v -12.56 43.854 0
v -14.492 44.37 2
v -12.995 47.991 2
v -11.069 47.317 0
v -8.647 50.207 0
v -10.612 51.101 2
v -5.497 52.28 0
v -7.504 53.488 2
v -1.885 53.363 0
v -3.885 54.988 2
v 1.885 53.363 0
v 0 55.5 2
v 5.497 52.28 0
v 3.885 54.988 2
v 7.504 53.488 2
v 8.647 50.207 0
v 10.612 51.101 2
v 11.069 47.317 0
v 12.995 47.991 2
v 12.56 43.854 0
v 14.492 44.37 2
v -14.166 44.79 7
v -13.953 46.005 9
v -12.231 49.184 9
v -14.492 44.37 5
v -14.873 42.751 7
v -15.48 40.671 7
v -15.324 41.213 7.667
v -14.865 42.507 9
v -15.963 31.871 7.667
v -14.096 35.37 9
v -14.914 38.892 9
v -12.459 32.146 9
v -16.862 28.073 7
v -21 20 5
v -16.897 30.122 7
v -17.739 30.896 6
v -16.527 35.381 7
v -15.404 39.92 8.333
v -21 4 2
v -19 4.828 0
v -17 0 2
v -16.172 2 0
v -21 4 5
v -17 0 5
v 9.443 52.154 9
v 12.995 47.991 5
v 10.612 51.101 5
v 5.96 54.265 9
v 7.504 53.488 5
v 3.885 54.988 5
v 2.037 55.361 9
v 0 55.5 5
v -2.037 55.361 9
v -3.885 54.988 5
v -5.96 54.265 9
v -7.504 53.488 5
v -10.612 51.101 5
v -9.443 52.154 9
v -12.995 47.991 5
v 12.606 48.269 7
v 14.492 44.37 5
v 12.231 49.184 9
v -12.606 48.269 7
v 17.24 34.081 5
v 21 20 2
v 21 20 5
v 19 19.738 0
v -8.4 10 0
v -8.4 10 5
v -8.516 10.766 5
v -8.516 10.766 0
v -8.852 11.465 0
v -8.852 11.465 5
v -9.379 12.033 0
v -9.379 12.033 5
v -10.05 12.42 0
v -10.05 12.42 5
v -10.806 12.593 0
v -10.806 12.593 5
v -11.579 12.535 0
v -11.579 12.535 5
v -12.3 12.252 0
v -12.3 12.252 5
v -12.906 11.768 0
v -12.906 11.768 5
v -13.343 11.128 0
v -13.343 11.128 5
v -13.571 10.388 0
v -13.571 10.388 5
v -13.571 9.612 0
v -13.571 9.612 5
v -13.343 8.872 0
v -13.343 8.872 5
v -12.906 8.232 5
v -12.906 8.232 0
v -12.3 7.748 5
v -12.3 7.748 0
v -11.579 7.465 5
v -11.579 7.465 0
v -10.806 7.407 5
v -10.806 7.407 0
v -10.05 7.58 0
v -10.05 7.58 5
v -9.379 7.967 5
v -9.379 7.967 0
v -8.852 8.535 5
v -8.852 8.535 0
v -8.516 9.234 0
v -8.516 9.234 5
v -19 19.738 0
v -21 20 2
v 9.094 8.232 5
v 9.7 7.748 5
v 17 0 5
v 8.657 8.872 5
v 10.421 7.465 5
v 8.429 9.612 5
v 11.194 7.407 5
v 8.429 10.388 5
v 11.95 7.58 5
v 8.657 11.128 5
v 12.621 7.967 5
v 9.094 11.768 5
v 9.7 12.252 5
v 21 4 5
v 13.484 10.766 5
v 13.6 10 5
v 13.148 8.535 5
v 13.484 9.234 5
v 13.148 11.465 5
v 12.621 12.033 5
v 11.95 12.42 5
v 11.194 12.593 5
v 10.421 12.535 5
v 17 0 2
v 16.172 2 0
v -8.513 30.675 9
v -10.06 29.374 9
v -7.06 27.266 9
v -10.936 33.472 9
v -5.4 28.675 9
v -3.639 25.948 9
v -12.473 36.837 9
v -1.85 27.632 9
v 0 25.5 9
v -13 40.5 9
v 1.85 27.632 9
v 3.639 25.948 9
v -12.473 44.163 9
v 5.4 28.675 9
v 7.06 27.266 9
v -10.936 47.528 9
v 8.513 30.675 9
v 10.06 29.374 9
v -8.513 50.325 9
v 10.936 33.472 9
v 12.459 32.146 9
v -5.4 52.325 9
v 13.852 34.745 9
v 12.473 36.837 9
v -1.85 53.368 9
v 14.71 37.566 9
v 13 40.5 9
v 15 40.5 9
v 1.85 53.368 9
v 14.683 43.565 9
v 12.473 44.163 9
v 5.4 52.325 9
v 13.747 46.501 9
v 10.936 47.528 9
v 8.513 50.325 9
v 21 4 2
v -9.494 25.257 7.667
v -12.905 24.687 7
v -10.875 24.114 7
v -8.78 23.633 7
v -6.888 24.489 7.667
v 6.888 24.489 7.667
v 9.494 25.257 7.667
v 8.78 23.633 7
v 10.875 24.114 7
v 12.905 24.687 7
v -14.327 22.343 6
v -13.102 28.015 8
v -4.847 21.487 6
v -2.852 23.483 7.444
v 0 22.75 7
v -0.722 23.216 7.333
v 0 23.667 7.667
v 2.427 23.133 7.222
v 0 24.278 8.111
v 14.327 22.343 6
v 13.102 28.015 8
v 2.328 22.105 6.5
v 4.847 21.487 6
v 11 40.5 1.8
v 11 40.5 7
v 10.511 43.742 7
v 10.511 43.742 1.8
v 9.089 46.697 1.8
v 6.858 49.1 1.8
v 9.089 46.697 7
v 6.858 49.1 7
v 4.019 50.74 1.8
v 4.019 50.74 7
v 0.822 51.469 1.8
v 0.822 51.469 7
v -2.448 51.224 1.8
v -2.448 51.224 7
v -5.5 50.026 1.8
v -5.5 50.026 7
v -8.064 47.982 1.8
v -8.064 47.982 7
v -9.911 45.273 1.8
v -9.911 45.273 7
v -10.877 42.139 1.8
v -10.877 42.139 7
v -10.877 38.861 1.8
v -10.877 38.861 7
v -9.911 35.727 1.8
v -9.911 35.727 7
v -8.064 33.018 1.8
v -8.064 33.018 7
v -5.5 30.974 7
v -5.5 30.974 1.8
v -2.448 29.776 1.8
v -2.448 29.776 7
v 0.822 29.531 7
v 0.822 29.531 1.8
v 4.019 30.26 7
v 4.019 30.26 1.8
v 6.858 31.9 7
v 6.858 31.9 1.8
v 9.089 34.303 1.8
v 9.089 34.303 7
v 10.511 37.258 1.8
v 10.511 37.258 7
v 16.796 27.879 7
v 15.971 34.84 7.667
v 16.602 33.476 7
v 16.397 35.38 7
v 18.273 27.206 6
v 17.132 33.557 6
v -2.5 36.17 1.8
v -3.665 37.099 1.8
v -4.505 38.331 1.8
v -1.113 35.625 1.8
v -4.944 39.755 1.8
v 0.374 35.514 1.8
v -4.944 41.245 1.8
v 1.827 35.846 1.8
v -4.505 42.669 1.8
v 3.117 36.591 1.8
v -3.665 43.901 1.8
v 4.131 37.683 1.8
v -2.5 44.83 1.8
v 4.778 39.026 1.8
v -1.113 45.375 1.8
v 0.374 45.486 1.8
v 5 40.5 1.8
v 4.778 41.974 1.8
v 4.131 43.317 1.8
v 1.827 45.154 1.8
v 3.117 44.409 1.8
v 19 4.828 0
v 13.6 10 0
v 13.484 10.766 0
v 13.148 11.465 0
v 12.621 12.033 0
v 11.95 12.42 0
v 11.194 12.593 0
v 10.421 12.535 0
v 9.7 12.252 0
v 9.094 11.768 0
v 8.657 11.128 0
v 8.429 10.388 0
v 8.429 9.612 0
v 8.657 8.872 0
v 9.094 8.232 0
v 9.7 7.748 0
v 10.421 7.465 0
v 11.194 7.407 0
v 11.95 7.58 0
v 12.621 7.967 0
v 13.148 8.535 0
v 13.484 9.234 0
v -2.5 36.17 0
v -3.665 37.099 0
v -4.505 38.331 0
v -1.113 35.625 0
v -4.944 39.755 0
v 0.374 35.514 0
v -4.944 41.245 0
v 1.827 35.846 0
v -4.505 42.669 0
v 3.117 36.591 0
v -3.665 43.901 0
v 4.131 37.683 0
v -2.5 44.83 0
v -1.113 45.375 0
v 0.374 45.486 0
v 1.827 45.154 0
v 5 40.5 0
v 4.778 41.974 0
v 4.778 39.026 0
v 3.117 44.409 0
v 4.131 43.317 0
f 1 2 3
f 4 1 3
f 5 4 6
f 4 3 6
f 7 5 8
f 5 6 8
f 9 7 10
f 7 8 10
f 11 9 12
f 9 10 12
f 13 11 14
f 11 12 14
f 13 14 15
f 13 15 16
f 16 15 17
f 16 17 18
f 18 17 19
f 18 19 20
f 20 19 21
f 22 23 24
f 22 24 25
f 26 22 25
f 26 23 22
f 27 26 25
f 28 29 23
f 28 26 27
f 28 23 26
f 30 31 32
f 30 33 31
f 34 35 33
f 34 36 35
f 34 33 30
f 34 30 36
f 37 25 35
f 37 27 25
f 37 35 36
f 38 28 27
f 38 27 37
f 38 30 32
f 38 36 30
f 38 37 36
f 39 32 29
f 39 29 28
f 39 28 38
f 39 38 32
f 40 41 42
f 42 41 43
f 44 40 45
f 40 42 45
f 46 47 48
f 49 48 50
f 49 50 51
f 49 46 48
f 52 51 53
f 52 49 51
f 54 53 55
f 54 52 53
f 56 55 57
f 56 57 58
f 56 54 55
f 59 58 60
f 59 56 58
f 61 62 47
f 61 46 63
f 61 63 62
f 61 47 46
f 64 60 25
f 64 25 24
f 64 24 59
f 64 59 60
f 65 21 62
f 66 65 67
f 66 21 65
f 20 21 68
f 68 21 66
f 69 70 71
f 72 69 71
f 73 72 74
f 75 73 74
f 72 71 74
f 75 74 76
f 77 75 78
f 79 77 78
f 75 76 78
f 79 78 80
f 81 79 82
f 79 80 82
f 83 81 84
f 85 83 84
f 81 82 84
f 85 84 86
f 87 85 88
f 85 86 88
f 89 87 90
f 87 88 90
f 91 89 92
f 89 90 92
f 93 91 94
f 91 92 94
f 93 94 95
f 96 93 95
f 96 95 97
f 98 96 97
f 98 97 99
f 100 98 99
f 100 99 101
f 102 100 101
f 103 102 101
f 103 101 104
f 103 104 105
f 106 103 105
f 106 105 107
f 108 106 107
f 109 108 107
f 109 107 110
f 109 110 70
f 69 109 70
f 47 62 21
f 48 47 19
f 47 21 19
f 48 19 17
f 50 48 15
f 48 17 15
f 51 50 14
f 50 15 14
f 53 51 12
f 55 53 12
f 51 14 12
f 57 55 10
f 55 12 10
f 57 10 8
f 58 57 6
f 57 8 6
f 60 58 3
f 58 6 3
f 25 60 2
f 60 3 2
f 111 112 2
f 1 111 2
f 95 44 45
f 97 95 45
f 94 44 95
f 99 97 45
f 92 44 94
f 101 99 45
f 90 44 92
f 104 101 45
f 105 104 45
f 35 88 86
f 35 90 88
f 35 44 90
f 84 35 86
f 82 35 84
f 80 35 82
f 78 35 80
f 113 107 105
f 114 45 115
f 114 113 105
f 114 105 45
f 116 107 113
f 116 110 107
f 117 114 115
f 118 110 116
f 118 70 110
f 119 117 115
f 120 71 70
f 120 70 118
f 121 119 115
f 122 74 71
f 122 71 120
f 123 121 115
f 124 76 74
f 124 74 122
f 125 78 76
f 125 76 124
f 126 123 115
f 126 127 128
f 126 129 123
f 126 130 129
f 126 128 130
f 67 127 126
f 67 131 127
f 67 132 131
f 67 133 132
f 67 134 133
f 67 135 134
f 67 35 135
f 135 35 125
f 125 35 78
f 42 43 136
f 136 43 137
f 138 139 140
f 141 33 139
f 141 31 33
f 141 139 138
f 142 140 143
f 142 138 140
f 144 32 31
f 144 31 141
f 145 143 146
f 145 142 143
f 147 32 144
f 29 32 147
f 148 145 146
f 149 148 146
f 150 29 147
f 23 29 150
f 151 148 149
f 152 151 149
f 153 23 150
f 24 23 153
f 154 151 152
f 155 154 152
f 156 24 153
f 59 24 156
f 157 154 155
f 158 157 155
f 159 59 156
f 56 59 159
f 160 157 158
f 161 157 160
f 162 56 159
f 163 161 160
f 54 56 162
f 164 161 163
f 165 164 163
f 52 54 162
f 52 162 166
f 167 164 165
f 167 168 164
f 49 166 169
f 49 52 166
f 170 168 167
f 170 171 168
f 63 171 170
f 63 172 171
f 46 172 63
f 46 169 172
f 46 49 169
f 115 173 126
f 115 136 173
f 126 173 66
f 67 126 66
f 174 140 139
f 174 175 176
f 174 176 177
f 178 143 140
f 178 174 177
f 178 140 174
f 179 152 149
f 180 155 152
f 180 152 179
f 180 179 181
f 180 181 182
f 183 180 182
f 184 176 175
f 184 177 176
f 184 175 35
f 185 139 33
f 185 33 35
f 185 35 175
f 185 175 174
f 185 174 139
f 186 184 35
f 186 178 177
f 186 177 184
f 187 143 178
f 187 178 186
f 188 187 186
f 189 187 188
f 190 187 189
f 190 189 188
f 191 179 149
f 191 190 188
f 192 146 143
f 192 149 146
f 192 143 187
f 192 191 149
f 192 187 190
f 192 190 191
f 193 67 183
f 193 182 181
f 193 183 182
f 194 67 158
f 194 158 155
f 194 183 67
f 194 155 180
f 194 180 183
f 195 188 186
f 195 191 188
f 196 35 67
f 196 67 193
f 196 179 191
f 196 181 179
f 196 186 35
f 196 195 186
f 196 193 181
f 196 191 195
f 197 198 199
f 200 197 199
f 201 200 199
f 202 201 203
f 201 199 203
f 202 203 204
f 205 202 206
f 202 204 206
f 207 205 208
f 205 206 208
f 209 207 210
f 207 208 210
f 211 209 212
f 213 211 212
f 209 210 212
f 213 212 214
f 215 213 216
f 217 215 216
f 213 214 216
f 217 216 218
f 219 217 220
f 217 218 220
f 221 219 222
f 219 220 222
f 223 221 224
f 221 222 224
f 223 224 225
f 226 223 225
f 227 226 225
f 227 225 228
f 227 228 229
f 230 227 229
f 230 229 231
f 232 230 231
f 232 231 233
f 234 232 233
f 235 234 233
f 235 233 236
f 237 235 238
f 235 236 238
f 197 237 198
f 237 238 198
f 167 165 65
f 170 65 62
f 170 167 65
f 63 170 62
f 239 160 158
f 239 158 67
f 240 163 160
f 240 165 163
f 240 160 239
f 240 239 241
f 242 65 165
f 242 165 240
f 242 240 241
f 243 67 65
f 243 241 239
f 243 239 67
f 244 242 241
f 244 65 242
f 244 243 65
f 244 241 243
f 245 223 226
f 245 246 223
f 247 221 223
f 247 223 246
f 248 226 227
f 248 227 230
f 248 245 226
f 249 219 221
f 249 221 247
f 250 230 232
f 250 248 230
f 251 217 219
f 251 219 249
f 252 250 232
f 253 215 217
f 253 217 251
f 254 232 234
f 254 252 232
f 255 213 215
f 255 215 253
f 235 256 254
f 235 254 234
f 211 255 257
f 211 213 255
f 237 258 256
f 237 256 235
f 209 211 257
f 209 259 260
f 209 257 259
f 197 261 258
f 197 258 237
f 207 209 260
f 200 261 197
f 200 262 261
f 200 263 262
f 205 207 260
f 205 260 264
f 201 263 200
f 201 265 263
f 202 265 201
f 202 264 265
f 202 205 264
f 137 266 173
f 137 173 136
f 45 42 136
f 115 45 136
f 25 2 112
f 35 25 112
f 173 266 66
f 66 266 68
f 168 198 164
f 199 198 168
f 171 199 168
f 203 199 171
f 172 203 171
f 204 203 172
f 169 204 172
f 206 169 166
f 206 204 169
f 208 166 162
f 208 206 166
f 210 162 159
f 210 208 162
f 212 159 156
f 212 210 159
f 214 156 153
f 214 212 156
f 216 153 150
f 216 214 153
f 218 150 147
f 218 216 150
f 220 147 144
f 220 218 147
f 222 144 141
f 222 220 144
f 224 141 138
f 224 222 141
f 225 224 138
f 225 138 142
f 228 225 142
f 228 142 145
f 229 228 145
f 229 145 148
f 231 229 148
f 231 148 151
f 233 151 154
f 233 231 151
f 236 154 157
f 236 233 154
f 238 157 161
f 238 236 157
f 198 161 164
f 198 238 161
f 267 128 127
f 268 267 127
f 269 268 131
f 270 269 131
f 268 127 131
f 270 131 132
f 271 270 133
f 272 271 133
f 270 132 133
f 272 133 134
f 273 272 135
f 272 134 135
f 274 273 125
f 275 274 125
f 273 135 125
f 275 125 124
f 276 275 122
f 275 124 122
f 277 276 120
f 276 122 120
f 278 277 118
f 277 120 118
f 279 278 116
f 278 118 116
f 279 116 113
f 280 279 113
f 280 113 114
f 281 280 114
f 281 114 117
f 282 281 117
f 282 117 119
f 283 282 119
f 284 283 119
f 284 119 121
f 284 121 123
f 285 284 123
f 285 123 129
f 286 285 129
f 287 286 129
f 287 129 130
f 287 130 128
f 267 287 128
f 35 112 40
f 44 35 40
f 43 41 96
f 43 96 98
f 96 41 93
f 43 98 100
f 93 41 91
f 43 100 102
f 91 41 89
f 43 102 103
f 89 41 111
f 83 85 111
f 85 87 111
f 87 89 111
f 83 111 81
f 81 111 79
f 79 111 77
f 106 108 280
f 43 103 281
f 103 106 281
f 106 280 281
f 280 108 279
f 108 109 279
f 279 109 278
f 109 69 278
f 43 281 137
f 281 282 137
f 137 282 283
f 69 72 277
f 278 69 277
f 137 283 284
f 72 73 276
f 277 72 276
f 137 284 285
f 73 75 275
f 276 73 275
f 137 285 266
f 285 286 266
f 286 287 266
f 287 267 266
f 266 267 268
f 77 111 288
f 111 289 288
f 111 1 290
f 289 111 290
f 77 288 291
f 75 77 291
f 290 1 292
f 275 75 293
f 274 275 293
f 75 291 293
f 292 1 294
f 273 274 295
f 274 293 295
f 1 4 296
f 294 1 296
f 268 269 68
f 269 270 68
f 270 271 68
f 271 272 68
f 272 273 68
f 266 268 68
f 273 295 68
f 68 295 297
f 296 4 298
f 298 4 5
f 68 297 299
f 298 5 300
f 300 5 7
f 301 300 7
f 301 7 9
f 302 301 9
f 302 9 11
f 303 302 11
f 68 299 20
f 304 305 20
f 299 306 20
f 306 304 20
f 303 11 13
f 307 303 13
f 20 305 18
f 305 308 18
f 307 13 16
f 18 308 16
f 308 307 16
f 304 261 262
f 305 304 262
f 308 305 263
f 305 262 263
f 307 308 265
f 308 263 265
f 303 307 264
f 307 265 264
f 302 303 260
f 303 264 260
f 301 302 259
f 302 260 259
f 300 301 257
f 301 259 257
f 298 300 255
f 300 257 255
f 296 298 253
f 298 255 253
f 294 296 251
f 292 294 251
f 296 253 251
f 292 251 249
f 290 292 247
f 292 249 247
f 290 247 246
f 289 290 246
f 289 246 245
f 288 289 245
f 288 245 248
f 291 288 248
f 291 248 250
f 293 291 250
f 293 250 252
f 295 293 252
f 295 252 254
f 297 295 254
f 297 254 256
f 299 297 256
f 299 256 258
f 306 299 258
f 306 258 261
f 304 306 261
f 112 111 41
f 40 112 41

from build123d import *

# Parameters (mm, degrees)
PAD_DEPTH       = 5
SKETCH002_R     = 15
SKETCH003_R     = 11
POCKET_DEPTH    = 7.2
SKETCH004_R     = 5
POCKET001_DEPTH = 1.801
SKETCH005_R     = 2.6
POCKET002_DEPTH = 5.001
CHAMFER_SIZE    = 2
CHAMFER001_SIZE = 4
CHAMFER002_SIZE = 2


with BuildPart() as part:
    # Sketch → Pad (new body)
    with BuildSketch(Plane.XY):
        with BuildLine():
            Line((-21, 20), (-21, 0))
            Line((-21, 0), (21, 0))
            Line((21, 0), (21, 20))
            Line((14.492167, 44.370025), (21, 20))
            ThreePointArc((14.492167, 44.370025), (0, 55.5), (-14.492167, 44.370025))
            Line((-14.492167, 44.370025), (-21, 20))
        make_face()
    extrude(amount=PAD_DEPTH)

    # Sketch001 (on Face8 of Pad) → AdditiveLoft section 0
    with BuildSketch(Plane.XY.offset(5)):
        with BuildLine():
            Line((-21, 20), (21, 20))
            Line((21, 20), (14.492167, 44.370025))
            ThreePointArc((14.492167, 44.370025), (0, 55.5), (-14.492167, 44.370025))
            Line((-14.492167, 44.370025), (-21, 20))
        make_face()
    # Sketch002 (on DatumPlane) → AdditiveLoft section 1
    with BuildSketch(Plane.XY.offset(9)):
        with Locations((0, 40.5)):
            Circle(SKETCH002_R)
    loft()

    # Sketch003 (on Face12 of AdditiveLoft) → Pocket (cut)
    with BuildSketch(Plane.XY.offset(9)):
        with Locations((0, 40.5)):
            Circle(SKETCH003_R)
    extrude(amount=-POCKET_DEPTH, mode=Mode.SUBTRACT)

    # Sketch004 (on Face16 of Pocket) → Pocket001 (cut, through all)
    with BuildSketch(Plane.XY.offset(1.8)):
        with Locations((0, 40.5)):
            Circle(SKETCH004_R)
    extrude(amount=-POCKET001_DEPTH, mode=Mode.SUBTRACT)

    # Sketch005 (on Face14 of Pocket001) → Pocket002 (cut, through all)
    with BuildSketch(Plane.XY.offset(5)):
        with Locations((-11, 10)):
            Circle(SKETCH005_R)
        with Locations((11, 10)):
            Circle(SKETCH005_R)
    extrude(amount=-POCKET002_DEPTH, mode=Mode.SUBTRACT)

    # Chamfer
    chamfer_edges = [part.edges().sort_by_distance(p)[0] for p in [
        (-11, 40.5, 9),
    ]]
    chamfer(chamfer_edges, length=CHAMFER_SIZE)

    # Chamfer001
    chamfer001_edges = [part.edges().sort_by_distance(p)[0] for p in [
        (21, 0, 2.5),
        (-21, 0, 2.5),
    ]]
    chamfer(chamfer001_edges, length=CHAMFER001_SIZE)

    # Chamfer002
    chamfer002_edges = [part.edges().sort_by_distance(p)[0] for p in [
        (-19, 2, 0),
        (0, 0, 0),
        (19, 2, 0),
        (21, 12, 0),
        (17.746084, 32.185012, 0),
        (0, 55.5, 0),
        (-17.746084, 32.185012, 0),
        (-21, 12, 0),
    ]]
    chamfer(chamfer002_edges, length=CHAMFER002_SIZE)


solid = part.part
